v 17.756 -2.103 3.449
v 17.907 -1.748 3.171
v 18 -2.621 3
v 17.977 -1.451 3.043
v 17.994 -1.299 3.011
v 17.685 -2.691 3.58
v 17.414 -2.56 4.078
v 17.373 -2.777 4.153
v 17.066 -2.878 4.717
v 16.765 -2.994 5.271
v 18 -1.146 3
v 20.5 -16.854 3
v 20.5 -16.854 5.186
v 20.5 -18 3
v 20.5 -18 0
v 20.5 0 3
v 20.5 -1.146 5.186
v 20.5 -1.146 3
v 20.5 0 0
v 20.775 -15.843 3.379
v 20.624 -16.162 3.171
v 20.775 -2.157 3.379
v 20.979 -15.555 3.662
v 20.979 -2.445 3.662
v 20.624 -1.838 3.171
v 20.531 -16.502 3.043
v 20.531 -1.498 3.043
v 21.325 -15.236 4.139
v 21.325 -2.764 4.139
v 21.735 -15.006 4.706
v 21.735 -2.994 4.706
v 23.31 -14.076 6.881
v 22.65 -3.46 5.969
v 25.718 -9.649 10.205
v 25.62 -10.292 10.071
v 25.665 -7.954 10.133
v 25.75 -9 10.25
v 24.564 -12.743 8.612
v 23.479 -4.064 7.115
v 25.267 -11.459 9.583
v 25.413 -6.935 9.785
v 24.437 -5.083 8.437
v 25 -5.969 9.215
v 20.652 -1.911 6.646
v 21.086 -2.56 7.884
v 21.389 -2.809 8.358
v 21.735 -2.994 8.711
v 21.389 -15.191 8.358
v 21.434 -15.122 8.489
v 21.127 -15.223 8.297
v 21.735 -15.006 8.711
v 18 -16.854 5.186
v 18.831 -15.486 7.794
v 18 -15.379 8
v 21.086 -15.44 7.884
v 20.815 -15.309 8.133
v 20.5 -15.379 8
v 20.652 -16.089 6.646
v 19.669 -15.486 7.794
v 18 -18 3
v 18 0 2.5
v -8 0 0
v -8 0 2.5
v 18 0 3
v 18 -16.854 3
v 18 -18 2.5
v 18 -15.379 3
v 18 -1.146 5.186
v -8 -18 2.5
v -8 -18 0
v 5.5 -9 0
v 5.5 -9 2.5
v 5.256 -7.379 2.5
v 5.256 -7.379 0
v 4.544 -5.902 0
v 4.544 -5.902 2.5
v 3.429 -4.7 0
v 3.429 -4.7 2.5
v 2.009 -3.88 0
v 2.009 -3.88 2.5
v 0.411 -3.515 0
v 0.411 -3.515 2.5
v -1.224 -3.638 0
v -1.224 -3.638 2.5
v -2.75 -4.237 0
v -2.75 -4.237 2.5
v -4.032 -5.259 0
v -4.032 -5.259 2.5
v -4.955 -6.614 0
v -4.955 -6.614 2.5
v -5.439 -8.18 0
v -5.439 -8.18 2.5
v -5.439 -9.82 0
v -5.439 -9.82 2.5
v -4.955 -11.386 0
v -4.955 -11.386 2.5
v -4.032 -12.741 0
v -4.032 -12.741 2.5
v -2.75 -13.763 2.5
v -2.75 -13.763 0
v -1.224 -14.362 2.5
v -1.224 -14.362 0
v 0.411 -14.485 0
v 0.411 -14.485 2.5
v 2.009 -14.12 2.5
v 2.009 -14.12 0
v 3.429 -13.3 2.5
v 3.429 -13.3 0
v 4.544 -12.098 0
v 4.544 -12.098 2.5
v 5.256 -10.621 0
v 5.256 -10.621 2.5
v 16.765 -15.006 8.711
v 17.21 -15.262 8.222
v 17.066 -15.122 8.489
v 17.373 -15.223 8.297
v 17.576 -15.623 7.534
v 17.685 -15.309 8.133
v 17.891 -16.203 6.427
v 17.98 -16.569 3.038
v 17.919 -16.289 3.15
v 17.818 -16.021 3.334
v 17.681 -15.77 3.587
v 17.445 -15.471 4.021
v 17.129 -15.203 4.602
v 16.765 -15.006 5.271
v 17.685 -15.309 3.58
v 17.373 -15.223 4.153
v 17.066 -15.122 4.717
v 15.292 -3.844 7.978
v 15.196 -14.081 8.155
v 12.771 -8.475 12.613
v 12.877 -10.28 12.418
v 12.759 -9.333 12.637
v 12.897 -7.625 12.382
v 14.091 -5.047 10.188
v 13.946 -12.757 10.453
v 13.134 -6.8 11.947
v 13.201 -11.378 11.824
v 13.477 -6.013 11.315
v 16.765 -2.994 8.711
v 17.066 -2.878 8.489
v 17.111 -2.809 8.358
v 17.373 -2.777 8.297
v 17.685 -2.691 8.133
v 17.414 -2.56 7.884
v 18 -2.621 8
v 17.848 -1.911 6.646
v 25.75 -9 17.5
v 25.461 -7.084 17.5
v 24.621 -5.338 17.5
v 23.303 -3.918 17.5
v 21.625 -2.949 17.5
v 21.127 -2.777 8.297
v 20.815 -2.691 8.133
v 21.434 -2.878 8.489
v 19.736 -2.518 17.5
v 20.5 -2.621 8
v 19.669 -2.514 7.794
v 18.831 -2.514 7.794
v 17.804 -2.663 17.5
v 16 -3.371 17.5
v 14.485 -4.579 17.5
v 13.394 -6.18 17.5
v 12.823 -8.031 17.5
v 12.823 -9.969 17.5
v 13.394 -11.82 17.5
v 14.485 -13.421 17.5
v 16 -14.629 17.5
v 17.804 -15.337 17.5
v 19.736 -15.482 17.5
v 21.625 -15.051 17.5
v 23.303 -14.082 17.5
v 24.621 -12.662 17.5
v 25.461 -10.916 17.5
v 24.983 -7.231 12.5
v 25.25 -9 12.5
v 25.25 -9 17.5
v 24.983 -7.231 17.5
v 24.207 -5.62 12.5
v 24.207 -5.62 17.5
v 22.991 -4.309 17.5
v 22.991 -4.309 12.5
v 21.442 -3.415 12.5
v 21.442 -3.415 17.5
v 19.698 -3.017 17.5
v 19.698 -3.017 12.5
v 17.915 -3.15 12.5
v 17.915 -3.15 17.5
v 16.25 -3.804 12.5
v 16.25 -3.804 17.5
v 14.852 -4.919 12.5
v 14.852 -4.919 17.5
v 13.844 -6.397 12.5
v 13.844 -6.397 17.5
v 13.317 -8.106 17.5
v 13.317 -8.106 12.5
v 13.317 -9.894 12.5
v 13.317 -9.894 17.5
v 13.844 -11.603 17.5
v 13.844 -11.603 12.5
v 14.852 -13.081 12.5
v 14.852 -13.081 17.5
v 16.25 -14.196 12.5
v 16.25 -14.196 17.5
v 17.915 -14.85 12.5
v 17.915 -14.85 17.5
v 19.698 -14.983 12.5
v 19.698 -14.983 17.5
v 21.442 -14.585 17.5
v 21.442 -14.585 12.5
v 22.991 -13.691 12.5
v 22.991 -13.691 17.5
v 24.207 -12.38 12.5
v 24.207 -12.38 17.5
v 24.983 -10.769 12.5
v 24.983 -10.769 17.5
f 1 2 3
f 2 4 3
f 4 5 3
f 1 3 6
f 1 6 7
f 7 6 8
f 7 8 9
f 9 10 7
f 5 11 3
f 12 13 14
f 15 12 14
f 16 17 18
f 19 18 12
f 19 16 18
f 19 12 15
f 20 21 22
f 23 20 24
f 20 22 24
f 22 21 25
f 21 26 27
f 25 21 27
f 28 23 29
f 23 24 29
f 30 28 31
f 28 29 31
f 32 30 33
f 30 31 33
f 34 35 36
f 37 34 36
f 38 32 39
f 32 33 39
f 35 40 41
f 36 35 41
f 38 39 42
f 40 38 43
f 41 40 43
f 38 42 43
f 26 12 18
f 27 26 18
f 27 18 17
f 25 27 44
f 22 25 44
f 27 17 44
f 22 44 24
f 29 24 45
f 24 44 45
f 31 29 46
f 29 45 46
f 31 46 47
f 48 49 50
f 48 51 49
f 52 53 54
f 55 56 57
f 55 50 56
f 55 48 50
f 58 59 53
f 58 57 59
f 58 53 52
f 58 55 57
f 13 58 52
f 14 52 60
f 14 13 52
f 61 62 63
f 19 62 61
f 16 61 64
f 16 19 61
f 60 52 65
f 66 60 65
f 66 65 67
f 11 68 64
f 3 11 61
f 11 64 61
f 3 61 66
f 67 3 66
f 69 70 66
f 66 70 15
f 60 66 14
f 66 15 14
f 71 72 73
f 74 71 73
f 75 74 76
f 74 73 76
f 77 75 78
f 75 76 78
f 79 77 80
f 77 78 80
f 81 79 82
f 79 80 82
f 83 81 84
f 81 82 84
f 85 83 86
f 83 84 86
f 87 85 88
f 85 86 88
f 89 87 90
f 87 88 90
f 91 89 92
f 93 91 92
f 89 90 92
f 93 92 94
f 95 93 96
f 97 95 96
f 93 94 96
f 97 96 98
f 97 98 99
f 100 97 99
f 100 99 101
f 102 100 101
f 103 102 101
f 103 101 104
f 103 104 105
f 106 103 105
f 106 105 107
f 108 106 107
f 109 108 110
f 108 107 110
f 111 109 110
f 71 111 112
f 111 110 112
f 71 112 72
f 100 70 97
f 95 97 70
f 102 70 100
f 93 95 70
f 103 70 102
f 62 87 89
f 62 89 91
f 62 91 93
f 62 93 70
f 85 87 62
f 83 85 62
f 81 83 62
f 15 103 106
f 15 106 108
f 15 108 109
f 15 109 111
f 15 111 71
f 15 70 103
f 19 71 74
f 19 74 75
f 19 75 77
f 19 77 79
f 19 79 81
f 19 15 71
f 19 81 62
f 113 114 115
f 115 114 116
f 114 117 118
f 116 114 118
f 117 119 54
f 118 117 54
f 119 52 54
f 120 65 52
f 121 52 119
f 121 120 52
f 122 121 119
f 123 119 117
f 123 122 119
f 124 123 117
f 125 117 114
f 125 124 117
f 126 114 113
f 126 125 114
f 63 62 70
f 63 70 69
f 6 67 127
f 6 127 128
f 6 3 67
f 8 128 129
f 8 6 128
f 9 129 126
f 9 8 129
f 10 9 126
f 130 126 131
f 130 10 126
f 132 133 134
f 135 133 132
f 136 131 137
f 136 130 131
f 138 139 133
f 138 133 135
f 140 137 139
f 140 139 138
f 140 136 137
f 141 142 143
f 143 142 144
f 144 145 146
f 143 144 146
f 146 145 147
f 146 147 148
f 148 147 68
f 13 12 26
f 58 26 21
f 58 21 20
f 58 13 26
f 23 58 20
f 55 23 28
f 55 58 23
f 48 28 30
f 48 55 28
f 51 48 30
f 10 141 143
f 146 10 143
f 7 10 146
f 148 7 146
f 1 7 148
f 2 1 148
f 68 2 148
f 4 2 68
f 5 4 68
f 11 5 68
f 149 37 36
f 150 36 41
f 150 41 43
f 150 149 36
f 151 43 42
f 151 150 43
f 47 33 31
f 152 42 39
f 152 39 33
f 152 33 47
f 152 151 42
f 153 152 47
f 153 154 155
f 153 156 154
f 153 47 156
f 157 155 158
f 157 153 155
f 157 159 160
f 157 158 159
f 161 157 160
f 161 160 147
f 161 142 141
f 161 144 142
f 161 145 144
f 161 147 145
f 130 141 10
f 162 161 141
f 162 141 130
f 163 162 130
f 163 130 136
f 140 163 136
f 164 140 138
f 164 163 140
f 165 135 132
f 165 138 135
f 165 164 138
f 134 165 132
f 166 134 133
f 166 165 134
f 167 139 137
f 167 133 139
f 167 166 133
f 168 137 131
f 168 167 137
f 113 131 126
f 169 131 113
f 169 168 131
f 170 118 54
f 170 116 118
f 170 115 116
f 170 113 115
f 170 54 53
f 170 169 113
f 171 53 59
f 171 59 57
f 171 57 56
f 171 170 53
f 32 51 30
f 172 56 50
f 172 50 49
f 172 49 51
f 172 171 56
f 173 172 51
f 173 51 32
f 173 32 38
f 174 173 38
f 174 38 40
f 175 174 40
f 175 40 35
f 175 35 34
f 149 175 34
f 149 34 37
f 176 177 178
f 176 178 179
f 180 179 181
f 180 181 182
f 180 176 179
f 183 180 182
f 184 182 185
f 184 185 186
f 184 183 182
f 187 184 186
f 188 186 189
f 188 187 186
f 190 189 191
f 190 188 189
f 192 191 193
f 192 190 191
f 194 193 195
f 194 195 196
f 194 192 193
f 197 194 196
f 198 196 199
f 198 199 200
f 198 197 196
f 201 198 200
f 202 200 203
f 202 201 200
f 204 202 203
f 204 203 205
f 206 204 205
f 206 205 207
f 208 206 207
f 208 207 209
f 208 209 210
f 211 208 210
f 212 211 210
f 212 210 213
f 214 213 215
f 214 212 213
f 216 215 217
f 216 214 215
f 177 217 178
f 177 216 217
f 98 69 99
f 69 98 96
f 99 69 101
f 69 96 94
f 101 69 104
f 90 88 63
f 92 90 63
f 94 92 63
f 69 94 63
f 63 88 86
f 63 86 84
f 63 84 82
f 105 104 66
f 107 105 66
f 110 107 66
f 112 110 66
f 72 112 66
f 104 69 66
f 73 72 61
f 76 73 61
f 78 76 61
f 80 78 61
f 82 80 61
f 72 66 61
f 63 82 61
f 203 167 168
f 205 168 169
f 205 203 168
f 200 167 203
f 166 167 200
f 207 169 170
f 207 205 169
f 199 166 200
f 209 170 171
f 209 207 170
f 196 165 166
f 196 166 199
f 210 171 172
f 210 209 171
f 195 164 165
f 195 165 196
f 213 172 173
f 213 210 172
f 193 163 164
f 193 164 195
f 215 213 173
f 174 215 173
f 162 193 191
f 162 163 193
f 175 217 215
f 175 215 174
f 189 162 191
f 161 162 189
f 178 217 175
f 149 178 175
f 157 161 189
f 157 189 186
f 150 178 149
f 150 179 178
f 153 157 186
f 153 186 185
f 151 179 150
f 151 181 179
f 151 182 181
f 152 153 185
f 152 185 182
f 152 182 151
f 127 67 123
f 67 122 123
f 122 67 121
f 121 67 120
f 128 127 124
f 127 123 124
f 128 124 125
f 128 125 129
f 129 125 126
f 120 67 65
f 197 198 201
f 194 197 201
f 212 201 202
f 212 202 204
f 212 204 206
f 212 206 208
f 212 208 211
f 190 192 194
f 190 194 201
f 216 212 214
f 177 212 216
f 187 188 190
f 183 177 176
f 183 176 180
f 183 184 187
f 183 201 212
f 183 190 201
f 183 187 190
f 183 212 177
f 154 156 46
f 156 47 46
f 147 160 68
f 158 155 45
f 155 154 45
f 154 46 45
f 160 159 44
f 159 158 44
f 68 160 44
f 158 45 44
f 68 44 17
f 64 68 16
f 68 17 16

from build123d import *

# Parameters (mm, degrees)
SZKIC1_W                     = 18
SZKIC1_H                     = 18
DODANIE_WYCI_GNI_CIE1_DEPTH  = 2.5
SZKIC3_R                     = 6.5
SZKIC3_R_2                   = 6
DODANIE_WYCI_GNI_CIE2_DEPTH  = 5
SZKIC5_R                     = 6.5
DODANIE_WYCI_GNI_CIE3_DEPTH  = 9.5
SZKIC6_W                     = 2.5
SZKIC6_H                     = 18
DODANIE_WYCI_GNI_CIE4_DEPTH  = 3
WYTNIJ_WYCI_GNI_CIE3_DEPTH   = 20
DODANIE_WYCI_GNI_CIE11_DEPTH = 2.5
ZAOKR_GLENIE3_R              = 2
ZAOKR_GLENIE4_R              = 2
ZAOKR_GLENIE5_R              = 2
ZAOKR_GLENIE6_R              = 2
SZKIC21_W                    = 2.5
SZKIC21_H                    = 18
DODANIE_WYCI_GNI_CIE12_DEPTH = 8
SZKIC23_R                    = 5.5
WYTNIJ_WYCI_GNI_CIE4_DEPTH   = 2.5


with BuildPart() as part:
    # Szkic1 → Dodanie-wyciągnięcie1 (new body)
    with BuildSketch(Plane.XY):
        with Locations((9, -9)):
            Rectangle(SZKIC1_W, SZKIC1_H)
    extrude(amount=DODANIE_WYCI_GNI_CIE1_DEPTH)

    # Szkic6 → Dodanie-wyciągnięcie4 (add)
    with BuildSketch(Plane(origin=(0, 0, 0), x_dir=(-1, 0, 0), z_dir=(0, 0, -1))):
        with Locations((-19.25, -9)):
            Rectangle(SZKIC6_W, SZKIC6_H)
    extrude(amount=-DODANIE_WYCI_GNI_CIE4_DEPTH)



with BuildPart() as body_2:
    # Szkic3 → Dodanie-wyciągnięcie2 (new body)
    with BuildSketch(Plane.XY.offset(12.5)):
        with Locations((19.25, -9)):
            Circle(SZKIC3_R)
        with Locations((19.25, -9)):
            Circle(SZKIC3_R_2, mode=Mode.SUBTRACT)
    extrude(amount=DODANIE_WYCI_GNI_CIE2_DEPTH)

    # Szkic5 → Dodanie-wyciągnięcie3 (add)
    with BuildSketch(Plane.XY.offset(12.5)):
        with Locations((19.25, -9)):
            Circle(SZKIC5_R)
    extrude(amount=-DODANIE_WYCI_GNI_CIE3_DEPTH)

    # Szkic17 → Wytnij-wyciągnięcie3 (cut)
    with BuildSketch(Plane(origin=(0, 0, 0), x_dir=(1, 0, 0), z_dir=(0, 1, 0))):
        Polygon((20.5, -3), (25.75, -10.25), (25.75, -3), align=None)
        Polygon((18, -3), (12.696843968, -12.75), (12.75, -3), align=None)
    extrude(amount=-WYTNIJ_WYCI_GNI_CIE3_DEPTH, mode=Mode.SUBTRACT)


with BuildPart() as part_1:
    add(part.part)

    add(body_2.part)  # Dodanie-wyciągnięcie11 merges body 2
    # Szkic19 → Dodanie-wyciągnięcie11 (add)
    with BuildSketch(Plane(origin=(20.5, 0, 0), x_dir=(0, 0, -1), z_dir=(1, 0, 0))):
        Polygon((-3, -18), (-3, -15.378675411), (-8, -15.378675411), align=None)
        Polygon((-3, 0), (-3, -2.621324589), (-8, -2.621324589), align=None)
    extrude(amount=-DODANIE_WYCI_GNI_CIE11_DEPTH)

    # Zaokrąglenie3
    zaokr_glenie3_edges = [part_1.edges().sort_by_distance(p)[0] for p in [
        (20.5, -15.378675411, 5.5),
    ]]
    fillet(zaokr_glenie3_edges, radius=ZAOKR_GLENIE3_R)

    # Zaokrąglenie4
    zaokr_glenie4_edges = [part_1.edges().sort_by_distance(p)[0] for p in [
        (20.5, -2.621324589, 5.5),
    ]]
    fillet(zaokr_glenie4_edges, radius=ZAOKR_GLENIE4_R)

    # Zaokrąglenie5
    # the kernel refuses this fillet: 2 mm, written as the material it adds along each edge
    with BuildSketch(Plane(origin=(18, -15.378675411, -0.688659063), x_dir=(0, -1, 0), z_dir=(0, 0, 1))) as zaokr_glenie5_piece_1_section:
        with BuildLine():
            CenterArc((1.475463625, -2), ZAOKR_GLENIE5_R, 90, 67.520494391)
            ThreePointArc((-0.372569089, -1.235294118), (-0.155557822, -0.626914348), (0, 0))
            Line((0, 0), (1.475463625, 0))
        make_face()
    zaokr_glenie5_piece_1 = extrude(amount=12.377318126, mode=Mode.PRIVATE)
    zaokr_glenie5_piece_1 = split(zaokr_glenie5_piece_1, bisect_by=Plane(origin=(16.879667194, -15.616046578, 5.059763053), z_dir=(0.878464068971863, 0, 0.47780841299143956)), keep=Keep.TOP, mode=Mode.PRIVATE)
    zaokr_glenie5_piece_1 = split(zaokr_glenie5_piece_1, bisect_by=Plane(origin=(17.729689725, -16.448851128, 5.958711939), z_dir=(0, 0.8856656985010092, -0.46432345460758234)), keep=Keep.TOP, mode=Mode.PRIVATE)
    add(zaokr_glenie5_piece_1)

    # Zaokrąglenie6
    # the kernel refuses this fillet: 2 mm, written as the material it adds along each edge
    with BuildSketch(Plane(origin=(18, -2.621324589, -0.688659063), x_dir=(0, 1, 0), z_dir=(0, 0, 1))) as zaokr_glenie6_piece_1_section:
        with BuildLine():
            CenterArc((1.475463625, 2), ZAOKR_GLENIE6_R, 202.479505609, 67.520494391)
            ThreePointArc((-0.372569089, 1.235294118), (-0.155557822, 0.626914348), (0, 0))
            Line((0, 0), (1.475463625, 0))
        make_face()
    zaokr_glenie6_piece_1 = extrude(amount=12.377318126, mode=Mode.PRIVATE)
    zaokr_glenie6_piece_1 = split(zaokr_glenie6_piece_1, bisect_by=Plane(origin=(17.729689725, -1.551148872, 5.958711939), z_dir=(0, -0.8856656985010092, -0.4643234546075823)), keep=Keep.TOP, mode=Mode.PRIVATE)
    zaokr_glenie6_piece_1 = split(zaokr_glenie6_piece_1, bisect_by=Plane(origin=(16.879667194, -2.383953422, 5.059763053), z_dir=(0.8784640689720787, 0, 0.4778084129910428)), keep=Keep.TOP, mode=Mode.PRIVATE)
    add(zaokr_glenie6_piece_1)

    # Szkic21 → Dodanie-wyciągnięcie12 (add)
    with BuildSketch(Plane.ZY):
        with Locations((1.25, -9)):
            Rectangle(SZKIC21_W, SZKIC21_H)
    extrude(amount=DODANIE_WYCI_GNI_CIE12_DEPTH)

    # Szkic23 → Wytnij-wyciągnięcie4 (cut)
    with BuildSketch(Plane.XY.offset(2.5)):
        with Locations((0, -9)):
            Circle(SZKIC23_R)
    extrude(amount=-WYTNIJ_WYCI_GNI_CIE4_DEPTH, mode=Mode.SUBTRACT)


solid = part_1.part
